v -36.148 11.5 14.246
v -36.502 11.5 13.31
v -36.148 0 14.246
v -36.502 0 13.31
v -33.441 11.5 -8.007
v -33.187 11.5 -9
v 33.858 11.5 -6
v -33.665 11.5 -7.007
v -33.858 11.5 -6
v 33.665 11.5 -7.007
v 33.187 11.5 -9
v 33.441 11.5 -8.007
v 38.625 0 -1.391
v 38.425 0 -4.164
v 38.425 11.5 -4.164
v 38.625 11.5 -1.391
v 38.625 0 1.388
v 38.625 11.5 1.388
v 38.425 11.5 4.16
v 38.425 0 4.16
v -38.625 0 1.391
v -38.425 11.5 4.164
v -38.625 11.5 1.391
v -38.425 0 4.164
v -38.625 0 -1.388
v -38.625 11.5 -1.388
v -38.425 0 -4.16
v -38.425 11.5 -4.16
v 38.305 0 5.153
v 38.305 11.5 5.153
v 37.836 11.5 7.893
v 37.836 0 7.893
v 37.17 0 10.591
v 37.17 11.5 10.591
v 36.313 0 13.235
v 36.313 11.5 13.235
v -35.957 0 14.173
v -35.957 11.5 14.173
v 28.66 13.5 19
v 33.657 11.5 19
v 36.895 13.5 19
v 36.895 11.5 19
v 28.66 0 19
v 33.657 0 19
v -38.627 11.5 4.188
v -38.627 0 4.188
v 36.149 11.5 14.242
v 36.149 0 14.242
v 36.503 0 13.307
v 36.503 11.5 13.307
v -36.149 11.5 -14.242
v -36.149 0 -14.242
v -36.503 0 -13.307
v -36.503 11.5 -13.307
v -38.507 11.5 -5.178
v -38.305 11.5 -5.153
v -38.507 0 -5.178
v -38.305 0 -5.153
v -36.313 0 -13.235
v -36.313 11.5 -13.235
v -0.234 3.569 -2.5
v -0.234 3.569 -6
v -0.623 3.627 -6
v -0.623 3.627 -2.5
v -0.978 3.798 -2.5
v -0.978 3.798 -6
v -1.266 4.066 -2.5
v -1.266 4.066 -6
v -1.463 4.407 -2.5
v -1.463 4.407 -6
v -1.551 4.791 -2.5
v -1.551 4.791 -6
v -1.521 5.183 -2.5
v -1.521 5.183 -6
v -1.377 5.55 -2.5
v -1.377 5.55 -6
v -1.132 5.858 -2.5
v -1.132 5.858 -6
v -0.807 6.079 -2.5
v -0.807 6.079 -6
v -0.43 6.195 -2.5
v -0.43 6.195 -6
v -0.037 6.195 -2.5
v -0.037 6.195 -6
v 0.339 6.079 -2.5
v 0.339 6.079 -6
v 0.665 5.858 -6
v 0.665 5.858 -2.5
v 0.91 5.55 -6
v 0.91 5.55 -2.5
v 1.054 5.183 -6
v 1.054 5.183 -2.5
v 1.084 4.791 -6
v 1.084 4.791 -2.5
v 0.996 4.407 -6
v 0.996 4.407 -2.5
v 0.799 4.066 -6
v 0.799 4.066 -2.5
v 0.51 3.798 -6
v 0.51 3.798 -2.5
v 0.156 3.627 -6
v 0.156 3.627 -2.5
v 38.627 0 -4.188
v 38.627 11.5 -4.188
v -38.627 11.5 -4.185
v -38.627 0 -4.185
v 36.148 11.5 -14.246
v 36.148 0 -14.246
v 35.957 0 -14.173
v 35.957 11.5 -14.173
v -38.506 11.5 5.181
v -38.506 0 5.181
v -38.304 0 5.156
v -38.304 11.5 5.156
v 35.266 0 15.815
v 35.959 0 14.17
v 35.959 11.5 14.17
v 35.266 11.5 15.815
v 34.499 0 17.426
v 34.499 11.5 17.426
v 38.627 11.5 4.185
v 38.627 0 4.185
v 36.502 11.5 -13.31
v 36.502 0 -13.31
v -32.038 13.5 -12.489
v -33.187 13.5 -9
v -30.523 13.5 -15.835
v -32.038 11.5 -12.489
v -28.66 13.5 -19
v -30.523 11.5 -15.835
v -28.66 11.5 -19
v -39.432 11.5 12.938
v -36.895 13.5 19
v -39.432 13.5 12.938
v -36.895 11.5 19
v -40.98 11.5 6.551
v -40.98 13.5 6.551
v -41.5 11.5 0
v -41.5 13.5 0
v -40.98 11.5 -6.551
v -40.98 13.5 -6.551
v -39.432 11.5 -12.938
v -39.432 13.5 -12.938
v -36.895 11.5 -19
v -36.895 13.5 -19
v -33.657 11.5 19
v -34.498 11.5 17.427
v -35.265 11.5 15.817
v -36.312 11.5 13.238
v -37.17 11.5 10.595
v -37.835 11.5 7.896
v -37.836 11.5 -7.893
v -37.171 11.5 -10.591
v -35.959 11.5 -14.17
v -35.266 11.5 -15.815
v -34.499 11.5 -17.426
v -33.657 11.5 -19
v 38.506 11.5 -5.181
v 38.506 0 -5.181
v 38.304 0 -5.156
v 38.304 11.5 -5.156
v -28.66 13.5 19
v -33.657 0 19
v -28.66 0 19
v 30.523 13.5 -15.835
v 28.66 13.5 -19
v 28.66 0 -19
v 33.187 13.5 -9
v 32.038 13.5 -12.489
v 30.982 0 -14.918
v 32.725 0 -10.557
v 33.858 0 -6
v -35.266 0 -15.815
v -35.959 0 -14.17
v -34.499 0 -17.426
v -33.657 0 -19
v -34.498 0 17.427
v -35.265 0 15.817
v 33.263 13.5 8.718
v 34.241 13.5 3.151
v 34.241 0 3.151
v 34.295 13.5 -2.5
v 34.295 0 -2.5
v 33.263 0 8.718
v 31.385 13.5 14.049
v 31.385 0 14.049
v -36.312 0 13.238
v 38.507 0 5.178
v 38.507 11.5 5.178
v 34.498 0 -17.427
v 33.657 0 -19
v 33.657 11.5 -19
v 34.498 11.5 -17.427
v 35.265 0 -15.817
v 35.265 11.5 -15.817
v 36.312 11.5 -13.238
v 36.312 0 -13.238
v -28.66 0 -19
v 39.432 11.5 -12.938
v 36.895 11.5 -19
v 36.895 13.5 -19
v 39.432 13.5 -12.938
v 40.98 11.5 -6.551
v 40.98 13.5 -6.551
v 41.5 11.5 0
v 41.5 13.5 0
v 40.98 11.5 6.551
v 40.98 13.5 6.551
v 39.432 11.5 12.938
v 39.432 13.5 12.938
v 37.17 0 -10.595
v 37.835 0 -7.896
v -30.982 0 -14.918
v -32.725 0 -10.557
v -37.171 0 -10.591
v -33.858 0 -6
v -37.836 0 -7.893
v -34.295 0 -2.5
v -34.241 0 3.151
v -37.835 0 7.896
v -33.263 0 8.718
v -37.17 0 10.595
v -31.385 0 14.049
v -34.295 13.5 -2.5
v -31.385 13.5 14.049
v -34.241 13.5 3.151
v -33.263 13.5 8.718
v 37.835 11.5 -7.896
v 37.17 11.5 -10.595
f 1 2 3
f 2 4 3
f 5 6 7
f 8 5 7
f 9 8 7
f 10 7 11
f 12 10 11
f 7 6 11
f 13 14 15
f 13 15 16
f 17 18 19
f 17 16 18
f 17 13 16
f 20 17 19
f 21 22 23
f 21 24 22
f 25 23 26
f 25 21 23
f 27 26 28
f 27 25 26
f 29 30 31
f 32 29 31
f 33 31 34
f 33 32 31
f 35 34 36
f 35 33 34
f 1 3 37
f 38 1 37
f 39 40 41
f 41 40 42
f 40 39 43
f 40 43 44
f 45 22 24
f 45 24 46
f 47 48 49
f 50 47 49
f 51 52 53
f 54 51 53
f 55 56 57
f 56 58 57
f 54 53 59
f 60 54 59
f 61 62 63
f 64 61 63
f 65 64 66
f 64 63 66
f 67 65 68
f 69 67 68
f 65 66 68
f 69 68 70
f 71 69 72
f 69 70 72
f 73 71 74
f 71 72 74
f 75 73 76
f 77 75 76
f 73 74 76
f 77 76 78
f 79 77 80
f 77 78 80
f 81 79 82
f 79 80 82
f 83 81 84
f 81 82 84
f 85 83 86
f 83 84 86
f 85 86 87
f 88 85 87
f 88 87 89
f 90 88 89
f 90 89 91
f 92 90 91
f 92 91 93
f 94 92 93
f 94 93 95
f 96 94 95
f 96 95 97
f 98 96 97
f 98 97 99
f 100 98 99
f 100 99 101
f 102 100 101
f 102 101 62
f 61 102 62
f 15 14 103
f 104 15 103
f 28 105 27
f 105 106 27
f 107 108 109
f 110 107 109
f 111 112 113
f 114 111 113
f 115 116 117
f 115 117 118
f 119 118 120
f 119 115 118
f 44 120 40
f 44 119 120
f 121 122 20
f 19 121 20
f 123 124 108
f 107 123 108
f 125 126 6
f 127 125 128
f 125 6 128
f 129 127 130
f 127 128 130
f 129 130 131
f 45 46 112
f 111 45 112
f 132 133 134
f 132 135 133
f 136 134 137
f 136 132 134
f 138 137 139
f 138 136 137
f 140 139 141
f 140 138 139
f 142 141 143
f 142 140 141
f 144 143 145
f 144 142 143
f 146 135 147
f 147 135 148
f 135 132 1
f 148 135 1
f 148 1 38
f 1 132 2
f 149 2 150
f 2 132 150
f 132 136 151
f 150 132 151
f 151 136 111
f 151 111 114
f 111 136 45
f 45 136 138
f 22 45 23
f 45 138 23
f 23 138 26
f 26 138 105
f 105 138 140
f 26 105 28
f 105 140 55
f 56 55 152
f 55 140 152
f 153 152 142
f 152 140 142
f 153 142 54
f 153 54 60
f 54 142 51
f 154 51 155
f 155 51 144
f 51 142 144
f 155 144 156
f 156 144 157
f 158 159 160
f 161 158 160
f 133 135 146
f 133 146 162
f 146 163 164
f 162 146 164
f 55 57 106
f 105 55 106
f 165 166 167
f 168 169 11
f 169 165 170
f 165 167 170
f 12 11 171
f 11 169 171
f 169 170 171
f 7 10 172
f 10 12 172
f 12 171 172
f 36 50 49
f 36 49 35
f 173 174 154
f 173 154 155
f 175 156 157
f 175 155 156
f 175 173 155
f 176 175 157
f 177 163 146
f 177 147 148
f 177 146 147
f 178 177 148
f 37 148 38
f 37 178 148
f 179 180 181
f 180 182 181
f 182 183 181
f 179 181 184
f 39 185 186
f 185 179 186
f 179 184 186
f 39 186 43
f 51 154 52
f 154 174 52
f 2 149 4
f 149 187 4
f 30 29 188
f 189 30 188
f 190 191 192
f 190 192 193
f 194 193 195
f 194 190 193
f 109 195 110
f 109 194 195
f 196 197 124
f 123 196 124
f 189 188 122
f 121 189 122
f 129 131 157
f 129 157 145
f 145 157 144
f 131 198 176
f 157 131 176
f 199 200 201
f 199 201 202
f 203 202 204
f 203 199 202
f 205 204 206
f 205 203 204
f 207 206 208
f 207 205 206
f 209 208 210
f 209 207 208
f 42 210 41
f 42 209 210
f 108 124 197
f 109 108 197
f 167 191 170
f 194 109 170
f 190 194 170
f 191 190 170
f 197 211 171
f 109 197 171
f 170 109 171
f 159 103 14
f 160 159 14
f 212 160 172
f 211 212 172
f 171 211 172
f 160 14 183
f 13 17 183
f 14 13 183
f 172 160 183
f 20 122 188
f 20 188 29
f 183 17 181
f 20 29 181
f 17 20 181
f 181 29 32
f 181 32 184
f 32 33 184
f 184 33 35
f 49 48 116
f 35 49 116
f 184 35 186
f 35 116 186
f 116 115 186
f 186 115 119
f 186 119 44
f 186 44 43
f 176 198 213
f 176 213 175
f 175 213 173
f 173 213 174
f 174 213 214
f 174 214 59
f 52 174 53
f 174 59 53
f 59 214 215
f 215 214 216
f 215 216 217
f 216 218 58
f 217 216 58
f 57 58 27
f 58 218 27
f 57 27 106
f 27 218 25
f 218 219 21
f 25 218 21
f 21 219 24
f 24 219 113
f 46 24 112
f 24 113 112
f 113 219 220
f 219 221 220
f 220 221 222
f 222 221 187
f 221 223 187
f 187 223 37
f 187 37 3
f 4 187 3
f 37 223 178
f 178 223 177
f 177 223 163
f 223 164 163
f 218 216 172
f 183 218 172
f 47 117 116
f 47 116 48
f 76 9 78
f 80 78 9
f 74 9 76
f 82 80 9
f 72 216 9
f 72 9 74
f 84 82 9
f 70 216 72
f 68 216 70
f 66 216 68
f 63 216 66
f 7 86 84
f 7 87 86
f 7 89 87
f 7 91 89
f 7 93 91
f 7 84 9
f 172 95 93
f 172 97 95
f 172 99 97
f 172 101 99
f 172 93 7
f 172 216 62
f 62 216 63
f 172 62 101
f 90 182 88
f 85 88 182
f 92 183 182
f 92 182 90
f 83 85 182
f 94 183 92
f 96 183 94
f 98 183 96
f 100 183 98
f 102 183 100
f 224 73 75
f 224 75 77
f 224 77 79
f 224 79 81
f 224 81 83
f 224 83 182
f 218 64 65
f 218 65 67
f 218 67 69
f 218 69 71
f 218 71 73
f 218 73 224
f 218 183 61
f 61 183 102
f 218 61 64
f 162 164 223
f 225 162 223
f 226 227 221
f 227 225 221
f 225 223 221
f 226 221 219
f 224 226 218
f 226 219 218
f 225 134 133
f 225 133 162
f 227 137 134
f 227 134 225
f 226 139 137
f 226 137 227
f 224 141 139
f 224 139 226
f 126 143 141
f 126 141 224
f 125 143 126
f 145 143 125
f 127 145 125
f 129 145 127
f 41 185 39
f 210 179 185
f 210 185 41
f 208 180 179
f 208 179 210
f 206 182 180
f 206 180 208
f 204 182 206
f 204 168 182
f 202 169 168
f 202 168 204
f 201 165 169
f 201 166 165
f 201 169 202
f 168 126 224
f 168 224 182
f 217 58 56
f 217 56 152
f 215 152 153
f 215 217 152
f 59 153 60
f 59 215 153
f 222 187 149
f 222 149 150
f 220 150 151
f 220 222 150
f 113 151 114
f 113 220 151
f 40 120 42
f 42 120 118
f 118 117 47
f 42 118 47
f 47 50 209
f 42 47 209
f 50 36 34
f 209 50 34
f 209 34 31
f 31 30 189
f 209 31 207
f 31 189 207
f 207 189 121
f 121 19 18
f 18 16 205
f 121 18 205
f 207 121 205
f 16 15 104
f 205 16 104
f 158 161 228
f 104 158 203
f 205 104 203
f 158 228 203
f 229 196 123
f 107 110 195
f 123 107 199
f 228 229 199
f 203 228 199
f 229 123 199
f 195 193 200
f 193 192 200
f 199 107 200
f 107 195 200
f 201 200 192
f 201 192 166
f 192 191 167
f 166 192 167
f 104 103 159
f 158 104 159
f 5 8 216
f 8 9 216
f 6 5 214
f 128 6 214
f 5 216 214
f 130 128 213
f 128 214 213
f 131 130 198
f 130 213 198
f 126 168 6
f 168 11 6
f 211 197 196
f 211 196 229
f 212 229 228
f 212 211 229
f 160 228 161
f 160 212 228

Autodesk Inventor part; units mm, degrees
ref_plane "YZ Plane" through (0, 0, 0) normal (1, 0, 0) x (0, 1, 0)
ref_plane "XZ Plane" through (0, 0, 0) normal (0, 1, 0) x (-1, 0, 0)
ref_plane "XY Plane" through (0, 0, 0) normal (0, 0, 1) x (1, 0, 0)
sketch "Sketch1" plane through (0, 0, 0) normal (0, 1, 0) x (-1, 0, 0)
  line L0 (33.8585, -6) -> (-33.8585, -6)
  line L1 (-34.295, -2.5) -> (34.295, -2.5)
  line L2 (0.5017, -38.45) -> (-0.4983, -38.45)
  line L3 (-0.4983, -38.45) -> (-0.4983, -38.85)
  line L4 (-0.4983, -38.85) -> (0.5017, -38.85)
  line L5 (0.5017, -38.85) -> (0.5017, -38.45)
  line L6 (0.5017, -38.45) -> (-0.4983, -38.85) construction
  line L7 (-0.4983, -38.45) -> (0.5017, -38.85) construction
  line L8 (9.6888, -37.2126) -> (8.7179, -37.452)
  line L9 (8.7179, -37.452) -> (8.8136, -37.8403)
  line L10 (8.8136, -37.8403) -> (9.7846, -37.601)
  line L11 (9.7846, -37.601) -> (9.6888, -37.2126)
  line L12 (18.3129, -33.8126) -> (17.4274, -34.2773)
  line L13 (17.4274, -34.2773) -> (17.6133, -34.6315)
  line L14 (17.6133, -34.6315) -> (18.4987, -34.1668)
  line L15 (18.4987, -34.1668) -> (18.3129, -33.8126)
  line L16 (25.8726, -28.4475) -> (25.1241, -29.1107)
  line L17 (25.1241, -29.1107) -> (25.3893, -29.4101)
  line L18 (25.3893, -29.4101) -> (26.1379, -28.7469)
  line L19 (26.1379, -28.7469) -> (25.8726, -28.4475)
  line L20 (31.9287, -21.4292) -> (31.3607, -22.2522)
  line L21 (31.3607, -22.2522) -> (31.6899, -22.4794)
  line L22 (31.6899, -22.4794) -> (32.2579, -21.6564)
  line L23 (32.2579, -21.6564) -> (31.9287, -21.4292)
  line L24 (36.1293, -13.1654) -> (35.7747, -14.1005)
  line L25 (35.7747, -14.1005) -> (36.1487, -14.2423)
  line L26 (36.1487, -14.2423) -> (36.5033, -13.3073)
  line L27 (36.5033, -13.3073) -> (36.1293, -13.1654)
  line L28 (38.2301, -4.1366) -> (38.1096, -5.1293)
  line L29 (38.1096, -5.1293) -> (38.5067, -5.1775)
  line L30 (38.5067, -5.1775) -> (38.6272, -4.1848)
  line L31 (38.6272, -4.1848) -> (38.2301, -4.1366)
  line L32 (38.1092, 5.1327) -> (38.2297, 4.14)
  line L33 (38.2297, 4.14) -> (38.6268, 4.1882)
  line L34 (38.6268, 4.1882) -> (38.5063, 5.1809)
  line L35 (38.5063, 5.1809) -> (38.1092, 5.1327)
  line L36 (35.7735, 14.1037) -> (36.1281, 13.1687)
  line L37 (36.1281, 13.1687) -> (36.5021, 13.3105)
  line L38 (36.5021, 13.3105) -> (36.1475, 14.2455)
  line L39 (36.1475, 14.2455) -> (35.7735, 14.1037)
  line L40 (31.3587, 22.255) -> (31.9268, 21.432)
  line L41 (31.9268, 21.432) -> (32.256, 21.6592)
  line L42 (32.256, 21.6592) -> (31.6879, 22.4822)
  line L43 (31.6879, 22.4822) -> (31.3587, 22.255)
  line L44 (25.1215, 29.1129) -> (25.87, 28.4498)
  line L45 (25.87, 28.4498) -> (26.1353, 28.7492)
  line L46 (26.1353, 28.7492) -> (25.3868, 29.4123)
  line L47 (25.3868, 29.4123) -> (25.1215, 29.1129)
  line L48 (17.4244, 34.2789) -> (18.3098, 33.8142)
  line L49 (18.3098, 33.8142) -> (18.4957, 34.1684)
  line L50 (18.4957, 34.1684) -> (17.6102, 34.6331)
  line L51 (17.6102, 34.6331) -> (17.4244, 34.2789)
  line L52 (8.7145, 37.4528) -> (9.6855, 37.2135)
  line L53 (9.6855, 37.2135) -> (9.7812, 37.6018)
  line L54 (9.7812, 37.6018) -> (8.8103, 37.8412)
  line L55 (8.8103, 37.8412) -> (8.7145, 37.4528)
  line L56 (-0.5017, 38.45) -> (0.4983, 38.45)
  line L57 (0.4983, 38.45) -> (0.4983, 38.85)
  line L58 (0.4983, 38.85) -> (-0.5017, 38.85)
  line L59 (-0.5017, 38.85) -> (-0.5017, 38.45)
  line L60 (-9.6888, 37.2126) -> (-8.7179, 37.452)
  line L61 (-8.7179, 37.452) -> (-8.8136, 37.8403)
  line L62 (-8.8136, 37.8403) -> (-9.7846, 37.601)
  line L63 (-9.7846, 37.601) -> (-9.6888, 37.2126)
  line L64 (-18.3129, 33.8126) -> (-17.4274, 34.2773)
  line L65 (-17.4274, 34.2773) -> (-17.6133, 34.6315)
  line L66 (-17.6133, 34.6315) -> (-18.4987, 34.1668)
  line L67 (-18.4987, 34.1668) -> (-18.3129, 33.8126)
  line L68 (-25.8726, 28.4475) -> (-25.1241, 29.1107)
  line L69 (-25.1241, 29.1107) -> (-25.3893, 29.4101)
  line L70 (-25.3893, 29.4101) -> (-26.1379, 28.7469)
  line L71 (-26.1379, 28.7469) -> (-25.8726, 28.4475)
  line L72 (-31.9287, 21.4292) -> (-31.3607, 22.2522)
  line L73 (-31.3607, 22.2522) -> (-31.6899, 22.4794)
  line L74 (-31.6899, 22.4794) -> (-32.2579, 21.6564)
  line L75 (-32.2579, 21.6564) -> (-31.9287, 21.4292)
  line L76 (-36.1293, 13.1654) -> (-35.7747, 14.1005)
  line L77 (-35.7747, 14.1005) -> (-36.1487, 14.2423)
  line L78 (-36.1487, 14.2423) -> (-36.5033, 13.3073)
  line L79 (-36.5033, 13.3073) -> (-36.1293, 13.1654)
  line L80 (-38.2301, 4.1366) -> (-38.1096, 5.1293)
  line L81 (-38.1096, 5.1293) -> (-38.5067, 5.1775)
  line L82 (-38.5067, 5.1775) -> (-38.6272, 4.1848)
  line L83 (-38.6272, 4.1848) -> (-38.2301, 4.1366)
  line L84 (-38.1092, -5.1327) -> (-38.2297, -4.14)
  line L85 (-38.2297, -4.14) -> (-38.6268, -4.1882)
  line L86 (-38.6268, -4.1882) -> (-38.5063, -5.1809)
  line L87 (-38.5063, -5.1809) -> (-38.1092, -5.1327)
  line L88 (-35.7735, -14.1037) -> (-36.1281, -13.1687)
  line L89 (-36.1281, -13.1687) -> (-36.5021, -13.3105)
  line L90 (-36.5021, -13.3105) -> (-36.1475, -14.2455)
  line L91 (-36.1475, -14.2455) -> (-35.7735, -14.1037)
  line L92 (-31.3587, -22.255) -> (-31.9268, -21.432)
  line L93 (-31.9268, -21.432) -> (-32.256, -21.6592)
  line L94 (-32.256, -21.6592) -> (-31.6879, -22.4822)
  line L95 (-31.6879, -22.4822) -> (-31.3587, -22.255)
  line L96 (-25.1215, -29.1129) -> (-25.87, -28.4498)
  line L97 (-25.87, -28.4498) -> (-26.1353, -28.7492)
  line L98 (-26.1353, -28.7492) -> (-25.3868, -29.4123)
  line L99 (-25.3868, -29.4123) -> (-25.1215, -29.1129)
  line L100 (-17.4244, -34.2789) -> (-18.3098, -33.8142)
  line L101 (-18.3098, -33.8142) -> (-18.4957, -34.1684)
  line L102 (-18.4957, -34.1684) -> (-17.6102, -34.6331)
  line L103 (-17.6102, -34.6331) -> (-17.4244, -34.2789)
  line L104 (-8.7145, -37.4528) -> (-9.6855, -37.2135)
  line L105 (-9.6855, -37.2135) -> (-9.7812, -37.6018)
  line L106 (-9.7812, -37.6018) -> (-8.8103, -37.8412)
  line L107 (-8.8103, -37.8412) -> (-8.7145, -37.4528)
  arc A0 (-33.6574, 19) -> (32.0907, -21.5409) centre (0, 0) ccw
  arc A1 (33.6574, -19) -> (33.6574, 19) centre (0, 0) ccw
  arc A2 (32.0887, 21.5438) -> (-32.0907, 21.5409) centre (0, 0) ccw
  line L108 (36.1642, -3.8857) -> (36.1642, -3.8892)
  line L109 (36.1642, -4.8931) -> (36.1642, -4.8965)
  line L110 (-34.9312, -4.7468) -> (-34.9312, -4.7433)
  line L111 (-34.9312, -3.7395) -> (-34.9312, -3.736)
  line L112 (33.6574, -19) -> (28.66, -19)
  line L113 (-28.66, -19) -> (-33.6574, -19)
  line L114 (-33.6574, 19) -> (-28.66, 19)
  line L115 (28.66, 19) -> (33.6574, 19)
  arc A3 (28.66, -19) -> (33.8585, -6) centre (0, 0) ccw
  arc A4 (34.295, -2.5) -> (28.66, 19) centre (0, 0) ccw
  arc A5 (-28.66, 19) -> (-34.295, -2.5) centre (0, 0) ccw
  arc A6 (-33.8585, -6) -> (-28.66, -19) centre (0, 0) ccw
  point P0 (0.0017, -38.65)
  point P1 (35.9587, -14.1702)
  point P2 (36.3132, -13.2352)
  point P3 (38.3049, -5.153)
  point P4 (38.4254, -4.1603)
  point P5 (38.4251, 4.1637)
  point P6 (38.3045, 5.1564)
  point P7 (36.3121, 13.2384)
  point P8 (35.9574, 14.1734)
  point P9 (-35.9587, 14.1702)
  point P10 (-36.3132, 13.2352)
  point P11 (-38.3049, 5.153)
  point P12 (-38.4254, 4.1603)
  point P13 (-38.4251, -4.1637)
  point P14 (-38.3045, -5.1564)
  point P15 (-36.3121, -13.2384)
  point P16 (-35.9574, -14.1734)
  dimension "d2" = 2.5
  dimension "d3" = 3.5
  dimension "d10" = 1
  dimension "d11" = 0.4
  dimension "d14" = 360
  dimension "d18" = 38.65
  dimension "d19" = 4.9974
extrude "Extrusion1" add sketch "Sketch1" along normal blind 11.5 contours L0 A6 L113 A0 L91 L88 L89 L87 L84 L85 L83 L80 L81 L79 L76 L77 L114 A5 L1 A4 L115 A1 L39 L36 L37 L35 L32 L33 L31 L28 L29 L27 L24 L25 L112 A3 | A1 L27 L26 L25 | L25 L24 L27 A1 | A0 L89 L88 L91 | L91 L90 L89 A0 | A1 L31 L30 L29 | L29 L28 L31 A1 | A0 L85 L84 L87 | L87 L86 L85 A0 | A1 L35 L34 L33 | L33 L32 L35 A1 | A0 L81 L80 L83 | L83 L82 L81 A0 | A1 L39 L38 L37 | L37 L36 L39 A1 | A0 L77 L76 L79 | L79 L78 L77 A0
sketch "Sketch2" plane through (0, 11.5, 0) normal (0, 1, 0) x (1, 0, 0)
  arc A0 (33.8585, 6) -> (28.66, 19) centre (0, 0) ccw projected
  line L0 (34.295, 2.5) -> (-34.295, 2.5)
  line L1 (-3.804, 9) -> (7.0469, 9)
  line L2 (33.1873, 9) -> (-33.1873, 9)
  line L3 (-28.66, 19) -> (-33.6574, 19) projected
  line L4 (-33.6574, -19) -> (-28.66, -19) projected
  line L5 (-28.66, -19) -> (-36.8951, -19)
  arc A1 (-34.295, 2.5) -> (-28.66, -19) centre (0, 0) ccw
  arc A2 (28.66, -19) -> (34.295, 2.5) centre (0, 0) ccw
  arc A3 (36.8951, -19) -> (36.8951, 19) centre (0, 0) ccw
  arc A4 (-36.8951, 19) -> (-36.8951, -19) centre (0, 0) ccw
  arc A5 (33.1873, 9) -> (28.66, 19) centre (0, 0) ccw
  arc A6 (-28.66, 19) -> (-33.1873, 9) centre (0, 0) ccw
  line L6 (36.8951, 19) -> (28.66, 19)
  line L7 (-28.66, 19) -> (-36.8951, 19)
  line L8 (-31.7819, -19) -> (-28.66, -19)
  line L9 (28.66, -19) -> (36.8951, -19)
  line L10 (-30.5962, 19) -> (-28.66, 19)
  line L11 (28.66, 19) -> (36.8951, 19)
  point P0 (28.66, 19)
  point P1 (7.0469, 9)
  dimension "d24" = 41.5
  dimension "d25" = 6.5
extrude "Extrusion2" add sketch "Sketch2" along normal blind 2
sketch "Sketch3" plane through (-34.295, 0, -2.5) normal (0, 0, 1) x (1, 0, 0)
  line L0 (0, 13.5) -> (68.59, 13.5) projected
  line L1 (0, 0) -> (0, 13.5) projected
  point P0 (34.295, 0)
  point P1 (34.0614, 4.8894)
  dimension "d28" = 8.6106
  dimension "d29" = 34.0614
hole "Hole1" at (-0.2336, 4.8894, -2.5) direction (0, 0, -1) diameter 2.6416 depth 10.979 thread size "6-32 UNC" class "2B" standard "ANSI Unified Screw Threads"
properties part number "AQS_Mount_3DPrint"
